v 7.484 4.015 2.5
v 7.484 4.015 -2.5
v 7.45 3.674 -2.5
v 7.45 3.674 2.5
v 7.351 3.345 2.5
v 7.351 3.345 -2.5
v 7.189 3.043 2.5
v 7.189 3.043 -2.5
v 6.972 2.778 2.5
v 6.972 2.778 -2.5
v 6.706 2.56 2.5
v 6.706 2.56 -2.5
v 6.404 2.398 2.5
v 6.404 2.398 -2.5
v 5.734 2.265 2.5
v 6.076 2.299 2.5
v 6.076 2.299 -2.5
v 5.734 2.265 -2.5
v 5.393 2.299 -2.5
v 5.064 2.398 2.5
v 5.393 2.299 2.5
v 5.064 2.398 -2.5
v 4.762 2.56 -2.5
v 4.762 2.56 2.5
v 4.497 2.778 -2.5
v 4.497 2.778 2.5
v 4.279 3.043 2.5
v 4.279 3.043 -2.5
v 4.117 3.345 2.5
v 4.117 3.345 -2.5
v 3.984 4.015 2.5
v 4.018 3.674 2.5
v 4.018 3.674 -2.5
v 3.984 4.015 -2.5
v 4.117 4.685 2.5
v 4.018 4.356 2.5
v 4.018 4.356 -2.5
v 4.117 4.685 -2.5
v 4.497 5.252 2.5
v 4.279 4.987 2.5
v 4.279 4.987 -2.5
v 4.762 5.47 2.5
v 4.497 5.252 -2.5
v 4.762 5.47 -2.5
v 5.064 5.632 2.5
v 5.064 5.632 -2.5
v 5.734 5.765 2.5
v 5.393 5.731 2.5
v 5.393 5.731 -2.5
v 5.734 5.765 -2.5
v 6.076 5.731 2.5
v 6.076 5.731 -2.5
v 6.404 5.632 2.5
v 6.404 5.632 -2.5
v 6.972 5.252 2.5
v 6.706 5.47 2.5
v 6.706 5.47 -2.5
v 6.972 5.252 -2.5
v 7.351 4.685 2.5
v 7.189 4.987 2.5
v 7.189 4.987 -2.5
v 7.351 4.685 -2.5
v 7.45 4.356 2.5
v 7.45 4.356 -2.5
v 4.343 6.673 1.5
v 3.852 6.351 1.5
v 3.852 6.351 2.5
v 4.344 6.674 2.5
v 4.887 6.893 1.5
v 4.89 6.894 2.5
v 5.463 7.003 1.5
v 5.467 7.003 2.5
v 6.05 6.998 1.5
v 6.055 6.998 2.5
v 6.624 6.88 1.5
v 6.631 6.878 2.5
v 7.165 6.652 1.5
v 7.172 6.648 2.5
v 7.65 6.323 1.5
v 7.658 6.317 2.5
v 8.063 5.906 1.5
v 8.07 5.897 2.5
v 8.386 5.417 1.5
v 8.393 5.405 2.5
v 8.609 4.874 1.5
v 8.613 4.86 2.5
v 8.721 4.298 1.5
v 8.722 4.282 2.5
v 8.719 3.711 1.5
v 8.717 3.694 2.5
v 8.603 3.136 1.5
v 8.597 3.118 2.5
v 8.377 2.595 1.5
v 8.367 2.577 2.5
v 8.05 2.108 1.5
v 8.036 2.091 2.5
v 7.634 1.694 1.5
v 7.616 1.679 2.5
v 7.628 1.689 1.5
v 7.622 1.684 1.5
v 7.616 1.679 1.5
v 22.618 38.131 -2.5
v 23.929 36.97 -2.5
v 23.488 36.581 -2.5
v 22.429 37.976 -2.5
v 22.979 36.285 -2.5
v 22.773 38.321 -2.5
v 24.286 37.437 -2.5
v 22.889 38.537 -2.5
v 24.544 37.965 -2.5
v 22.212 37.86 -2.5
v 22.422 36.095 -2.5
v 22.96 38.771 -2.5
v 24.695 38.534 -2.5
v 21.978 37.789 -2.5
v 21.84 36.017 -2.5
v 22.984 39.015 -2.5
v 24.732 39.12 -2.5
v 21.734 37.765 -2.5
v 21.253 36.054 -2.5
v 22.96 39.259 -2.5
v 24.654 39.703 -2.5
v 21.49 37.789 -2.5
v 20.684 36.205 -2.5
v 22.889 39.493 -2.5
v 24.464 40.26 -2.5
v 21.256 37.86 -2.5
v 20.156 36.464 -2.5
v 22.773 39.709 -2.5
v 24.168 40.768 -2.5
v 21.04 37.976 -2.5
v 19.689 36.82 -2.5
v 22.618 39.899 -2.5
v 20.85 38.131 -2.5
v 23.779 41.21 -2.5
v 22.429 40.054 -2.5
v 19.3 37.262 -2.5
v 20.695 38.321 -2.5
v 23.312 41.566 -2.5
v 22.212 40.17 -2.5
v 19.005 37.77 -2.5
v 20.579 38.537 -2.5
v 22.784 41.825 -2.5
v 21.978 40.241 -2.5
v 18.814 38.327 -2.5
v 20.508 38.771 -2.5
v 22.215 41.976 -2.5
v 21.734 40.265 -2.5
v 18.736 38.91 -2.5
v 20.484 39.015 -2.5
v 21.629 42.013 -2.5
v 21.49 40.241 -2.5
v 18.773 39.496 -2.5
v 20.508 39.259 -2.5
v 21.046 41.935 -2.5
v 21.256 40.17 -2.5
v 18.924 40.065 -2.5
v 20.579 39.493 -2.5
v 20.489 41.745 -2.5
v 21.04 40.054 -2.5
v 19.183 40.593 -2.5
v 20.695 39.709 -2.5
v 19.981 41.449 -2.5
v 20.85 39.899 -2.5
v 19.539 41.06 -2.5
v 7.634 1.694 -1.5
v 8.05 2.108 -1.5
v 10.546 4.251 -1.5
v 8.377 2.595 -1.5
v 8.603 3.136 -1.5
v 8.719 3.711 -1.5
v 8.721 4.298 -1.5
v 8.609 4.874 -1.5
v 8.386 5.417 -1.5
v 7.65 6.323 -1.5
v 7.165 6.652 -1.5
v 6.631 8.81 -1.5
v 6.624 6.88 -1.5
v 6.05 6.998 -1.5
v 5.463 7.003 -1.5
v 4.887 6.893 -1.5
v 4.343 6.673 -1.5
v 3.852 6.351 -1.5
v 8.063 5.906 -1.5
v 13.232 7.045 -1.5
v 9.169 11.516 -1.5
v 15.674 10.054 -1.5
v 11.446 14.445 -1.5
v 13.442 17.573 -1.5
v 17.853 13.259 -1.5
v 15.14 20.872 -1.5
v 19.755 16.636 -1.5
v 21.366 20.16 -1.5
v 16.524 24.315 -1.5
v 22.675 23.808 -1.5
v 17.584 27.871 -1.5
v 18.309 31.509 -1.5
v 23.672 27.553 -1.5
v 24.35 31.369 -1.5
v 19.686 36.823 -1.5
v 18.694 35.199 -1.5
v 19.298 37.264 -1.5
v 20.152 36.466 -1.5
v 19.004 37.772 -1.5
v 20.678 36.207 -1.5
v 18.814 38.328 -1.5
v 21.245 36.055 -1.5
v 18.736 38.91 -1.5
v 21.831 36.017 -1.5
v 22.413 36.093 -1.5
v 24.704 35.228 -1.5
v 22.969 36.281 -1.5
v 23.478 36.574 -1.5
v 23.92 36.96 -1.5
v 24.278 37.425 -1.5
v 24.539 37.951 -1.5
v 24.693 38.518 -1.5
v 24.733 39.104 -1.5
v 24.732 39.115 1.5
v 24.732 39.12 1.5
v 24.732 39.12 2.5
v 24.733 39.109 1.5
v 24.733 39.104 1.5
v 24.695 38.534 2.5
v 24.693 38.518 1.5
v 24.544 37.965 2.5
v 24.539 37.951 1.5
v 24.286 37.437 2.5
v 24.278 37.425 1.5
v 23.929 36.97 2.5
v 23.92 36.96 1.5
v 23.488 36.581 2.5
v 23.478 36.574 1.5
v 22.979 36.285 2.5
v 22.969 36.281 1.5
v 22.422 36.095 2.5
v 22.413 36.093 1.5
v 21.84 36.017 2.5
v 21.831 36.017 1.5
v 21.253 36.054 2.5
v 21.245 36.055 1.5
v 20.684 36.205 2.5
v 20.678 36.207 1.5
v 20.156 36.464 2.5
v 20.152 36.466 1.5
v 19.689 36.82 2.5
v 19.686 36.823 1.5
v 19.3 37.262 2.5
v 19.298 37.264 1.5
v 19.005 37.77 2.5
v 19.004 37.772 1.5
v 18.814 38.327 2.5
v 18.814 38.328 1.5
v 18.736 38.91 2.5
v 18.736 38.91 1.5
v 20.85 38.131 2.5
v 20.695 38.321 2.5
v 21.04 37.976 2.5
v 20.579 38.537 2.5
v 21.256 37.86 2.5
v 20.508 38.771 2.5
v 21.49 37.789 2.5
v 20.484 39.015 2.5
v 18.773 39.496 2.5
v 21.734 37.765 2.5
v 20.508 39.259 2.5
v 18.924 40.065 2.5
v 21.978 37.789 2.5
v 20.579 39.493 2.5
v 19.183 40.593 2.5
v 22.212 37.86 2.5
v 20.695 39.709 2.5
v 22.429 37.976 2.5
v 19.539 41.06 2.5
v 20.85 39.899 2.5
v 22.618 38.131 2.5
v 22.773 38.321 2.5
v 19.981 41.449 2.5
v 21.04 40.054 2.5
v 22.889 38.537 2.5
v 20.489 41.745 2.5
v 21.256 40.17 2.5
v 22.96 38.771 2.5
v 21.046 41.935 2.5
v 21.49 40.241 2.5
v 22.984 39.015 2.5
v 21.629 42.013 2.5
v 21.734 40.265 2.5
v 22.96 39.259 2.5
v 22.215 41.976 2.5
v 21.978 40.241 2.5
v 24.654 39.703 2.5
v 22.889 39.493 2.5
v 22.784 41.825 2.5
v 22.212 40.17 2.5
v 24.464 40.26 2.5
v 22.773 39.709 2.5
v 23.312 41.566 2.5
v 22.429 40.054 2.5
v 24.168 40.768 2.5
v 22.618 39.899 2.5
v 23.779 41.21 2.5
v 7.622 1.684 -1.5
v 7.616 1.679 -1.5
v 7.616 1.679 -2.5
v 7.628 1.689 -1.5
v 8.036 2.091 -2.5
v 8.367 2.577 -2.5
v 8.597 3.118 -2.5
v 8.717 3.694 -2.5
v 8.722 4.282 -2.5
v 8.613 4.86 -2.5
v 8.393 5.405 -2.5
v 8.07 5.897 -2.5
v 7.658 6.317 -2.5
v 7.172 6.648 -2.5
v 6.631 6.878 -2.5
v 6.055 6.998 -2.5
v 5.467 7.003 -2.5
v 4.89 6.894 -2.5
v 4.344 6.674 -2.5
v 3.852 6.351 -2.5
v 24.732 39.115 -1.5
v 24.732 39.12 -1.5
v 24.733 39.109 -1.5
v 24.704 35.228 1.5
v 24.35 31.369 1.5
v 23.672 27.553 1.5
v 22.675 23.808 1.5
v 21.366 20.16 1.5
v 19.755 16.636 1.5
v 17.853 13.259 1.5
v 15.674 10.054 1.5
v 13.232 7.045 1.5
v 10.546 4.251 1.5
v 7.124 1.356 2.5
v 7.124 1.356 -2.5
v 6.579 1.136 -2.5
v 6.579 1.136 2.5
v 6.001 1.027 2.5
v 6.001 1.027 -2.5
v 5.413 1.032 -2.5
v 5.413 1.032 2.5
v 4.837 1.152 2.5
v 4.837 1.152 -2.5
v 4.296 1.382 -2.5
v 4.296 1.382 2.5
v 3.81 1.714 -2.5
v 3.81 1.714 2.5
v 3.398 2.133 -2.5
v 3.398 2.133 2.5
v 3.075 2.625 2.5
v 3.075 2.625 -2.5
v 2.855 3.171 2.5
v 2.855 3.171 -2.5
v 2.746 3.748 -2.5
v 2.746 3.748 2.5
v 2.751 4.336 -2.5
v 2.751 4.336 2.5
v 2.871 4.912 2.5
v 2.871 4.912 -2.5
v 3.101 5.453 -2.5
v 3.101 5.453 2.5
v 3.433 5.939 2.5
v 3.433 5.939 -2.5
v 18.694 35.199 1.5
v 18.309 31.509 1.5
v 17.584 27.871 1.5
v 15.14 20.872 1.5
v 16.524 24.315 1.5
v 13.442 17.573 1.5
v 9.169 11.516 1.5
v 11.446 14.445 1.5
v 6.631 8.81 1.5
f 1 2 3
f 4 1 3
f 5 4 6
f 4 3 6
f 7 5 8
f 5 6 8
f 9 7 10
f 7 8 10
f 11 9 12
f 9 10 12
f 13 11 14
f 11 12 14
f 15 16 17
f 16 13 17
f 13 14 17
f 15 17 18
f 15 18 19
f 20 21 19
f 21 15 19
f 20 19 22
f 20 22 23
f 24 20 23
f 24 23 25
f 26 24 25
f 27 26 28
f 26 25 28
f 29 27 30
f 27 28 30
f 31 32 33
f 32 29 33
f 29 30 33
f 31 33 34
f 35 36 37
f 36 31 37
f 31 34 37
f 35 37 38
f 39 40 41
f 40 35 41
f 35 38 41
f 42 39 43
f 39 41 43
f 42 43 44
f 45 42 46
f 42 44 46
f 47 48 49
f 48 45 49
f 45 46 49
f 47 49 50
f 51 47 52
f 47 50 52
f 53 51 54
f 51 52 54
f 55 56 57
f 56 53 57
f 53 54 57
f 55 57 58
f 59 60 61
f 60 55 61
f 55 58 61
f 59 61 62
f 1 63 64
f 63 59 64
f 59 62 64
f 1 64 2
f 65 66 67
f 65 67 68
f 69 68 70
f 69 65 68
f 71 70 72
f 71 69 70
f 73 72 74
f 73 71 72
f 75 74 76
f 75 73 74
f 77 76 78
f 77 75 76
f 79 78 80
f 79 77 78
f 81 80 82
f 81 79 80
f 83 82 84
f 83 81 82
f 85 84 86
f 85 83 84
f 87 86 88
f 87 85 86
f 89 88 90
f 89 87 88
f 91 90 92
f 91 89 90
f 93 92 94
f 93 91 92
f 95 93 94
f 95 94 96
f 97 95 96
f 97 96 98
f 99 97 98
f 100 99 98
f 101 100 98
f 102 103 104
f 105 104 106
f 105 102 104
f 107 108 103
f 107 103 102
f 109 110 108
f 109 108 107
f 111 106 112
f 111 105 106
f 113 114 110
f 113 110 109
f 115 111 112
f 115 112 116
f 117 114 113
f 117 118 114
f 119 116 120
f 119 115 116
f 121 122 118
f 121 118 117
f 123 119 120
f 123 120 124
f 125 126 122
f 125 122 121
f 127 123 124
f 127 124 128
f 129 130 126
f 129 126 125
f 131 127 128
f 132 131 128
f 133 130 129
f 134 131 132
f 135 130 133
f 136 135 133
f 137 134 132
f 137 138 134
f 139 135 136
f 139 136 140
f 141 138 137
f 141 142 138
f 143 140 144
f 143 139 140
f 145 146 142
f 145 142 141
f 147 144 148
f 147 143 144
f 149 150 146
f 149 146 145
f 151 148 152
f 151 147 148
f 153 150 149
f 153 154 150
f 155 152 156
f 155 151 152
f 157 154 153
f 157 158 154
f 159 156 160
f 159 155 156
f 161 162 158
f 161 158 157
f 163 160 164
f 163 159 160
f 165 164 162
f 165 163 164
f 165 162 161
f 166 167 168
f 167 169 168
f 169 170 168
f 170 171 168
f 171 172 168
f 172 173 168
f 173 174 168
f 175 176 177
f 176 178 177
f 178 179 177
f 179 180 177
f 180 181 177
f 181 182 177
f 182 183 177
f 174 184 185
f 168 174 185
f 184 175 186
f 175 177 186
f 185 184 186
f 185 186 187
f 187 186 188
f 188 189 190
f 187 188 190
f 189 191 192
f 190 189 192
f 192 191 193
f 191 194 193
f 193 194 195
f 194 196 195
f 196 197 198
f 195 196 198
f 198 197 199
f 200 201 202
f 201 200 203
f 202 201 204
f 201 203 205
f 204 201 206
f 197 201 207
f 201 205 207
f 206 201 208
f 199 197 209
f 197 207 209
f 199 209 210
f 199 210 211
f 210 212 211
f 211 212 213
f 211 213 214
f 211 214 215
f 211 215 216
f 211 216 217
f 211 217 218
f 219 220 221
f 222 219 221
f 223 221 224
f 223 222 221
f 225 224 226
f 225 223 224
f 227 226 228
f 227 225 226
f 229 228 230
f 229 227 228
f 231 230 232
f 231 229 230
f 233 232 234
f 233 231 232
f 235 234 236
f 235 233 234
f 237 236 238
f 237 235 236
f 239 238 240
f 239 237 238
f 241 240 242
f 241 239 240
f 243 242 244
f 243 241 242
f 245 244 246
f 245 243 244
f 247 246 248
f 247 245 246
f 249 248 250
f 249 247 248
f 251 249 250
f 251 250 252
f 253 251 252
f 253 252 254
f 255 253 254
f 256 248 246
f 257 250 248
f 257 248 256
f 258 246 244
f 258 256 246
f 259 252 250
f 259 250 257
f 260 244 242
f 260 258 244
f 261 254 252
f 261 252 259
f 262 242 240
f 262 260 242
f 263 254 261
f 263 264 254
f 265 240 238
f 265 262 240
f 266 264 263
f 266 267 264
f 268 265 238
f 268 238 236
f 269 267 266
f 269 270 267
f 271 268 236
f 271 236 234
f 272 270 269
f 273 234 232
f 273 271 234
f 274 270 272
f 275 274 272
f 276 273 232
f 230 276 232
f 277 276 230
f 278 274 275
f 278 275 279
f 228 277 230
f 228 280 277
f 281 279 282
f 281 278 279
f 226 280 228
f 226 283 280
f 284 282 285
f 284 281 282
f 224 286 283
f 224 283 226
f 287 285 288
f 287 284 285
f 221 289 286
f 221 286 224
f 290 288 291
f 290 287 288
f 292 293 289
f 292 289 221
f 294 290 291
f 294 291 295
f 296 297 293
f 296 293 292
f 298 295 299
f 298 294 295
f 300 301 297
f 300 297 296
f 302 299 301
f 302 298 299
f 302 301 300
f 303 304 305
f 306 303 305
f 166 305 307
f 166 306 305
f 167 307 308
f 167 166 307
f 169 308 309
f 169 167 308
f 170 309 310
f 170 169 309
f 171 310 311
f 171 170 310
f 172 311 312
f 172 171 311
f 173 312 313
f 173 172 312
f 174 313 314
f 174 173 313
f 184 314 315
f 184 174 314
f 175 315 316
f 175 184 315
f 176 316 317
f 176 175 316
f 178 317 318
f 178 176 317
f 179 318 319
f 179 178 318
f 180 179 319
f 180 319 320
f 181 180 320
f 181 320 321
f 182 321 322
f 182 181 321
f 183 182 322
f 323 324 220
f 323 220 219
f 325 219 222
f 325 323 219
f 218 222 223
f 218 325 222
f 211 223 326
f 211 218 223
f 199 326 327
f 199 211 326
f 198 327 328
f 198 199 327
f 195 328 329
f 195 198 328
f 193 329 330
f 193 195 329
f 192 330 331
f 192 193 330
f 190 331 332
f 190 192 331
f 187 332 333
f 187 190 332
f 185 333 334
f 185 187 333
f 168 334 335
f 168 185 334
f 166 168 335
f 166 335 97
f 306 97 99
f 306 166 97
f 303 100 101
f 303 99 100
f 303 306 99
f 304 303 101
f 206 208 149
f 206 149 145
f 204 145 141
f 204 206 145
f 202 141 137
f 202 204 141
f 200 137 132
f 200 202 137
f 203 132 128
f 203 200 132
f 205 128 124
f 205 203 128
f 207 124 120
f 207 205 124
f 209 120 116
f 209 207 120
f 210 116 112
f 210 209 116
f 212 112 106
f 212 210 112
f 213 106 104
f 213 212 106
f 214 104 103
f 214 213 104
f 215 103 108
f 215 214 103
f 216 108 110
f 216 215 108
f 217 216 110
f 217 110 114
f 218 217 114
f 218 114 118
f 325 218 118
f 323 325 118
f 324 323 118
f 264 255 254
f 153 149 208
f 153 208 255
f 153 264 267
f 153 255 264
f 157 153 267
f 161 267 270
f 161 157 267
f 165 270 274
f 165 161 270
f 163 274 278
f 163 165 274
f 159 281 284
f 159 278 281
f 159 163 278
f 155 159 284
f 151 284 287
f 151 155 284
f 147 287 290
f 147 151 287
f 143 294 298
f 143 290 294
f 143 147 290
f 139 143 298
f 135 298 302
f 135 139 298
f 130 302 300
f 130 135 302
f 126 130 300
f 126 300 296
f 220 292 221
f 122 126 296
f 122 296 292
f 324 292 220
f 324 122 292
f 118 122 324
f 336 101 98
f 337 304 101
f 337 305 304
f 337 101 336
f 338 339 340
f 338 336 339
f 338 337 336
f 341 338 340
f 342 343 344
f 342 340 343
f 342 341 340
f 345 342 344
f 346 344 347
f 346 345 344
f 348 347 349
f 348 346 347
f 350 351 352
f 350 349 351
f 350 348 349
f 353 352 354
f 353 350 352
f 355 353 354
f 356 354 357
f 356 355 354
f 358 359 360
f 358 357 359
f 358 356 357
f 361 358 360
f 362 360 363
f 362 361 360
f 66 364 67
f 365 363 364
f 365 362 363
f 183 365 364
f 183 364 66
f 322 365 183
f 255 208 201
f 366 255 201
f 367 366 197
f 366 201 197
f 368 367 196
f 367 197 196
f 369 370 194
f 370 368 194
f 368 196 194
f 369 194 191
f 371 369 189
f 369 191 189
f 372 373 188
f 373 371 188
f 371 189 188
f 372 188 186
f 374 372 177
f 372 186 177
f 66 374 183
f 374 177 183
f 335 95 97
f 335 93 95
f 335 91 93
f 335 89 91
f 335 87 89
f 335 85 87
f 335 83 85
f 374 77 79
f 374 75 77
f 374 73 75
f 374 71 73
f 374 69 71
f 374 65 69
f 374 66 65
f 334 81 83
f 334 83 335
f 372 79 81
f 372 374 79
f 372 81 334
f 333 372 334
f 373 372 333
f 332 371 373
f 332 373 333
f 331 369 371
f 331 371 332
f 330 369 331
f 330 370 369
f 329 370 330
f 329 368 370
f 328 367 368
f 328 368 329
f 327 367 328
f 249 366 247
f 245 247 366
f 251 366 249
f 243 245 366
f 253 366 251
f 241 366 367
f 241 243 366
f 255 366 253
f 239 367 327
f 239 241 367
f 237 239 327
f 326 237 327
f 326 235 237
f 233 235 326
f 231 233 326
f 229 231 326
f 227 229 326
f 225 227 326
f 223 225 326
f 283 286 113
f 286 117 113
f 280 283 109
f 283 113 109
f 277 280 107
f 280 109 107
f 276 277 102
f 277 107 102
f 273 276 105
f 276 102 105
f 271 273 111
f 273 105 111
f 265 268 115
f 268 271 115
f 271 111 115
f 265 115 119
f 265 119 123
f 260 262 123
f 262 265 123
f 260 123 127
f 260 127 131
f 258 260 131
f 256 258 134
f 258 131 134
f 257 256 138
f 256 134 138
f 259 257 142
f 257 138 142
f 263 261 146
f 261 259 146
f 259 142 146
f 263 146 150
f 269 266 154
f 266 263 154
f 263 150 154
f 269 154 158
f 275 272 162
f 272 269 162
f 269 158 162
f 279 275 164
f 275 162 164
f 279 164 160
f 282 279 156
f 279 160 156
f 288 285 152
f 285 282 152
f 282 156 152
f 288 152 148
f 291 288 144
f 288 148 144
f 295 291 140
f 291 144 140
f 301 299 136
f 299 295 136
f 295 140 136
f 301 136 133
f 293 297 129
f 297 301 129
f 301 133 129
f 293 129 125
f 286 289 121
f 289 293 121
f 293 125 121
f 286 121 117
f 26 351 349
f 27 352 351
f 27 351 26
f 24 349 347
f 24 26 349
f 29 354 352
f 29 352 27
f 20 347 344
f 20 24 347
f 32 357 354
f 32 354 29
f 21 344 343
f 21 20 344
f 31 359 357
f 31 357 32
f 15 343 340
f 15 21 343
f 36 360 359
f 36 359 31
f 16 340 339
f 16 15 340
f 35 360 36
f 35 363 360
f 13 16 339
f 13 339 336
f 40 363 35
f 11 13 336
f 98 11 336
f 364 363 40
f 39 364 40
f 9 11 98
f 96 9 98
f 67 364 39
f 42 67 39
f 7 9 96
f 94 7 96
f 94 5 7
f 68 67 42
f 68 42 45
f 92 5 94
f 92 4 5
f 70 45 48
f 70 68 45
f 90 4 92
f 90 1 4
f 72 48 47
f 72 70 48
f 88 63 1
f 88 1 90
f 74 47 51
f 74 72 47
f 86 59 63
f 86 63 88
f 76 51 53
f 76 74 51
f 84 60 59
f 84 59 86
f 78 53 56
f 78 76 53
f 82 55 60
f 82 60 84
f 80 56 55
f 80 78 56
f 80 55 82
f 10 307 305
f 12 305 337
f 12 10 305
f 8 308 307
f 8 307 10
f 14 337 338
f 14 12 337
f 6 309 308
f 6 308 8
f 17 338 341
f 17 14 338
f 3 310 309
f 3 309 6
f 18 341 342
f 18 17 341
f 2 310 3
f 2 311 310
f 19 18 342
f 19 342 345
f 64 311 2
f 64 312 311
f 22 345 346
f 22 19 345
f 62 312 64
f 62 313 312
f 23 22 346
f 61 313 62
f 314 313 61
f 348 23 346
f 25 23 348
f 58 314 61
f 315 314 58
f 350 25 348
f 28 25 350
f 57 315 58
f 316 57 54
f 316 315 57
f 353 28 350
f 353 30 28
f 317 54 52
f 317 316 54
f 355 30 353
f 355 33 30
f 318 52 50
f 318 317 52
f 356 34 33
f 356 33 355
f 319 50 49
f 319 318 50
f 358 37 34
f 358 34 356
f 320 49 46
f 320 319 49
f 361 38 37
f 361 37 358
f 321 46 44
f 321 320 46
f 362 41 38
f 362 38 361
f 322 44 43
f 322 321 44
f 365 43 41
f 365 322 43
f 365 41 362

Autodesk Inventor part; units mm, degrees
ref_plane "YZ Plane" through (0, 0, 0) normal (1, 0, 0) x (0, 1, 0)
ref_plane "XZ Plane" through (0, 0, 0) normal (0, 1, 0) x (-1, 0, 0)
ref_plane "XY Plane" through (0, 0, 0) normal (0, 0, 1) x (1, 0, 0)
sketch "Sketch2" plane through (0, 0, 0) normal (0, 0, 1) x (1, 0, 0)
  circle A0 centre (21.7341, 39.015) radius 1.25
  arc A1 (5.7341, 4.015) -> (21.7341, 39.015) centre (-21.2393, 37.5029) ccw construction
  arc A2 (7.6159, 1.6787) -> (24.7322, 39.1205) centre (-21.2393, 37.5029) ccw
  arc A3 (3.8522, 6.3514) -> (18.7359, 38.9095) centre (-21.2393, 37.5029) ccw
  arc A4 (3.8522, 6.3514) -> (7.6159, 1.6787) centre (5.7341, 4.015) ccw
  arc A5 (24.7322, 39.1205) -> (18.7359, 38.9095) centre (21.7341, 39.015) ccw
  circle A6 centre (5.7341, 4.015) radius 1.75
  dimension "d18" = 6
  dimension "d21" = 40
  dimension "d22" = 35
  dimension "d23" = 16
  dimension "d24" = 2.5
  dimension "d26" = 3.5
extrude "Extrusion1" add sketch "Sketch2" along normal mid plane 3
sketch "Sketch3" plane through (0, 0, 1.5) normal (0, 0, 1) x (1, 0, 0)
  arc A0 (3.8522, 6.3514) -> (7.6159, 1.6787) centre (5.7341, 4.015) ccw projected
  arc A1 (24.7322, 39.1205) -> (18.7359, 38.9095) centre (21.7341, 39.015) ccw projected
  circle A2 centre (5.7341, 4.015) radius 1.75 projected
  circle A3 centre (21.7341, 39.015) radius 1.25 projected
  circle A4 centre (5.7341, 4.015) radius 3
  circle A5 centre (21.7341, 39.015) radius 3
  point P0 (0, 0)
  point P1 (18.7359, 38.9095)
  point P2 (24.7322, 39.1205)
  point P3 (7.6159, 1.6787)
  point P4 (3.8522, 6.3514)
extrude "Extrusion2" add sketch "Sketch3" along normal blind 1
mirror "Mirror1" about plane through (0, 0, 0) normal (0, 0, 1) of "Extrusion2"
properties part number "tolo"
